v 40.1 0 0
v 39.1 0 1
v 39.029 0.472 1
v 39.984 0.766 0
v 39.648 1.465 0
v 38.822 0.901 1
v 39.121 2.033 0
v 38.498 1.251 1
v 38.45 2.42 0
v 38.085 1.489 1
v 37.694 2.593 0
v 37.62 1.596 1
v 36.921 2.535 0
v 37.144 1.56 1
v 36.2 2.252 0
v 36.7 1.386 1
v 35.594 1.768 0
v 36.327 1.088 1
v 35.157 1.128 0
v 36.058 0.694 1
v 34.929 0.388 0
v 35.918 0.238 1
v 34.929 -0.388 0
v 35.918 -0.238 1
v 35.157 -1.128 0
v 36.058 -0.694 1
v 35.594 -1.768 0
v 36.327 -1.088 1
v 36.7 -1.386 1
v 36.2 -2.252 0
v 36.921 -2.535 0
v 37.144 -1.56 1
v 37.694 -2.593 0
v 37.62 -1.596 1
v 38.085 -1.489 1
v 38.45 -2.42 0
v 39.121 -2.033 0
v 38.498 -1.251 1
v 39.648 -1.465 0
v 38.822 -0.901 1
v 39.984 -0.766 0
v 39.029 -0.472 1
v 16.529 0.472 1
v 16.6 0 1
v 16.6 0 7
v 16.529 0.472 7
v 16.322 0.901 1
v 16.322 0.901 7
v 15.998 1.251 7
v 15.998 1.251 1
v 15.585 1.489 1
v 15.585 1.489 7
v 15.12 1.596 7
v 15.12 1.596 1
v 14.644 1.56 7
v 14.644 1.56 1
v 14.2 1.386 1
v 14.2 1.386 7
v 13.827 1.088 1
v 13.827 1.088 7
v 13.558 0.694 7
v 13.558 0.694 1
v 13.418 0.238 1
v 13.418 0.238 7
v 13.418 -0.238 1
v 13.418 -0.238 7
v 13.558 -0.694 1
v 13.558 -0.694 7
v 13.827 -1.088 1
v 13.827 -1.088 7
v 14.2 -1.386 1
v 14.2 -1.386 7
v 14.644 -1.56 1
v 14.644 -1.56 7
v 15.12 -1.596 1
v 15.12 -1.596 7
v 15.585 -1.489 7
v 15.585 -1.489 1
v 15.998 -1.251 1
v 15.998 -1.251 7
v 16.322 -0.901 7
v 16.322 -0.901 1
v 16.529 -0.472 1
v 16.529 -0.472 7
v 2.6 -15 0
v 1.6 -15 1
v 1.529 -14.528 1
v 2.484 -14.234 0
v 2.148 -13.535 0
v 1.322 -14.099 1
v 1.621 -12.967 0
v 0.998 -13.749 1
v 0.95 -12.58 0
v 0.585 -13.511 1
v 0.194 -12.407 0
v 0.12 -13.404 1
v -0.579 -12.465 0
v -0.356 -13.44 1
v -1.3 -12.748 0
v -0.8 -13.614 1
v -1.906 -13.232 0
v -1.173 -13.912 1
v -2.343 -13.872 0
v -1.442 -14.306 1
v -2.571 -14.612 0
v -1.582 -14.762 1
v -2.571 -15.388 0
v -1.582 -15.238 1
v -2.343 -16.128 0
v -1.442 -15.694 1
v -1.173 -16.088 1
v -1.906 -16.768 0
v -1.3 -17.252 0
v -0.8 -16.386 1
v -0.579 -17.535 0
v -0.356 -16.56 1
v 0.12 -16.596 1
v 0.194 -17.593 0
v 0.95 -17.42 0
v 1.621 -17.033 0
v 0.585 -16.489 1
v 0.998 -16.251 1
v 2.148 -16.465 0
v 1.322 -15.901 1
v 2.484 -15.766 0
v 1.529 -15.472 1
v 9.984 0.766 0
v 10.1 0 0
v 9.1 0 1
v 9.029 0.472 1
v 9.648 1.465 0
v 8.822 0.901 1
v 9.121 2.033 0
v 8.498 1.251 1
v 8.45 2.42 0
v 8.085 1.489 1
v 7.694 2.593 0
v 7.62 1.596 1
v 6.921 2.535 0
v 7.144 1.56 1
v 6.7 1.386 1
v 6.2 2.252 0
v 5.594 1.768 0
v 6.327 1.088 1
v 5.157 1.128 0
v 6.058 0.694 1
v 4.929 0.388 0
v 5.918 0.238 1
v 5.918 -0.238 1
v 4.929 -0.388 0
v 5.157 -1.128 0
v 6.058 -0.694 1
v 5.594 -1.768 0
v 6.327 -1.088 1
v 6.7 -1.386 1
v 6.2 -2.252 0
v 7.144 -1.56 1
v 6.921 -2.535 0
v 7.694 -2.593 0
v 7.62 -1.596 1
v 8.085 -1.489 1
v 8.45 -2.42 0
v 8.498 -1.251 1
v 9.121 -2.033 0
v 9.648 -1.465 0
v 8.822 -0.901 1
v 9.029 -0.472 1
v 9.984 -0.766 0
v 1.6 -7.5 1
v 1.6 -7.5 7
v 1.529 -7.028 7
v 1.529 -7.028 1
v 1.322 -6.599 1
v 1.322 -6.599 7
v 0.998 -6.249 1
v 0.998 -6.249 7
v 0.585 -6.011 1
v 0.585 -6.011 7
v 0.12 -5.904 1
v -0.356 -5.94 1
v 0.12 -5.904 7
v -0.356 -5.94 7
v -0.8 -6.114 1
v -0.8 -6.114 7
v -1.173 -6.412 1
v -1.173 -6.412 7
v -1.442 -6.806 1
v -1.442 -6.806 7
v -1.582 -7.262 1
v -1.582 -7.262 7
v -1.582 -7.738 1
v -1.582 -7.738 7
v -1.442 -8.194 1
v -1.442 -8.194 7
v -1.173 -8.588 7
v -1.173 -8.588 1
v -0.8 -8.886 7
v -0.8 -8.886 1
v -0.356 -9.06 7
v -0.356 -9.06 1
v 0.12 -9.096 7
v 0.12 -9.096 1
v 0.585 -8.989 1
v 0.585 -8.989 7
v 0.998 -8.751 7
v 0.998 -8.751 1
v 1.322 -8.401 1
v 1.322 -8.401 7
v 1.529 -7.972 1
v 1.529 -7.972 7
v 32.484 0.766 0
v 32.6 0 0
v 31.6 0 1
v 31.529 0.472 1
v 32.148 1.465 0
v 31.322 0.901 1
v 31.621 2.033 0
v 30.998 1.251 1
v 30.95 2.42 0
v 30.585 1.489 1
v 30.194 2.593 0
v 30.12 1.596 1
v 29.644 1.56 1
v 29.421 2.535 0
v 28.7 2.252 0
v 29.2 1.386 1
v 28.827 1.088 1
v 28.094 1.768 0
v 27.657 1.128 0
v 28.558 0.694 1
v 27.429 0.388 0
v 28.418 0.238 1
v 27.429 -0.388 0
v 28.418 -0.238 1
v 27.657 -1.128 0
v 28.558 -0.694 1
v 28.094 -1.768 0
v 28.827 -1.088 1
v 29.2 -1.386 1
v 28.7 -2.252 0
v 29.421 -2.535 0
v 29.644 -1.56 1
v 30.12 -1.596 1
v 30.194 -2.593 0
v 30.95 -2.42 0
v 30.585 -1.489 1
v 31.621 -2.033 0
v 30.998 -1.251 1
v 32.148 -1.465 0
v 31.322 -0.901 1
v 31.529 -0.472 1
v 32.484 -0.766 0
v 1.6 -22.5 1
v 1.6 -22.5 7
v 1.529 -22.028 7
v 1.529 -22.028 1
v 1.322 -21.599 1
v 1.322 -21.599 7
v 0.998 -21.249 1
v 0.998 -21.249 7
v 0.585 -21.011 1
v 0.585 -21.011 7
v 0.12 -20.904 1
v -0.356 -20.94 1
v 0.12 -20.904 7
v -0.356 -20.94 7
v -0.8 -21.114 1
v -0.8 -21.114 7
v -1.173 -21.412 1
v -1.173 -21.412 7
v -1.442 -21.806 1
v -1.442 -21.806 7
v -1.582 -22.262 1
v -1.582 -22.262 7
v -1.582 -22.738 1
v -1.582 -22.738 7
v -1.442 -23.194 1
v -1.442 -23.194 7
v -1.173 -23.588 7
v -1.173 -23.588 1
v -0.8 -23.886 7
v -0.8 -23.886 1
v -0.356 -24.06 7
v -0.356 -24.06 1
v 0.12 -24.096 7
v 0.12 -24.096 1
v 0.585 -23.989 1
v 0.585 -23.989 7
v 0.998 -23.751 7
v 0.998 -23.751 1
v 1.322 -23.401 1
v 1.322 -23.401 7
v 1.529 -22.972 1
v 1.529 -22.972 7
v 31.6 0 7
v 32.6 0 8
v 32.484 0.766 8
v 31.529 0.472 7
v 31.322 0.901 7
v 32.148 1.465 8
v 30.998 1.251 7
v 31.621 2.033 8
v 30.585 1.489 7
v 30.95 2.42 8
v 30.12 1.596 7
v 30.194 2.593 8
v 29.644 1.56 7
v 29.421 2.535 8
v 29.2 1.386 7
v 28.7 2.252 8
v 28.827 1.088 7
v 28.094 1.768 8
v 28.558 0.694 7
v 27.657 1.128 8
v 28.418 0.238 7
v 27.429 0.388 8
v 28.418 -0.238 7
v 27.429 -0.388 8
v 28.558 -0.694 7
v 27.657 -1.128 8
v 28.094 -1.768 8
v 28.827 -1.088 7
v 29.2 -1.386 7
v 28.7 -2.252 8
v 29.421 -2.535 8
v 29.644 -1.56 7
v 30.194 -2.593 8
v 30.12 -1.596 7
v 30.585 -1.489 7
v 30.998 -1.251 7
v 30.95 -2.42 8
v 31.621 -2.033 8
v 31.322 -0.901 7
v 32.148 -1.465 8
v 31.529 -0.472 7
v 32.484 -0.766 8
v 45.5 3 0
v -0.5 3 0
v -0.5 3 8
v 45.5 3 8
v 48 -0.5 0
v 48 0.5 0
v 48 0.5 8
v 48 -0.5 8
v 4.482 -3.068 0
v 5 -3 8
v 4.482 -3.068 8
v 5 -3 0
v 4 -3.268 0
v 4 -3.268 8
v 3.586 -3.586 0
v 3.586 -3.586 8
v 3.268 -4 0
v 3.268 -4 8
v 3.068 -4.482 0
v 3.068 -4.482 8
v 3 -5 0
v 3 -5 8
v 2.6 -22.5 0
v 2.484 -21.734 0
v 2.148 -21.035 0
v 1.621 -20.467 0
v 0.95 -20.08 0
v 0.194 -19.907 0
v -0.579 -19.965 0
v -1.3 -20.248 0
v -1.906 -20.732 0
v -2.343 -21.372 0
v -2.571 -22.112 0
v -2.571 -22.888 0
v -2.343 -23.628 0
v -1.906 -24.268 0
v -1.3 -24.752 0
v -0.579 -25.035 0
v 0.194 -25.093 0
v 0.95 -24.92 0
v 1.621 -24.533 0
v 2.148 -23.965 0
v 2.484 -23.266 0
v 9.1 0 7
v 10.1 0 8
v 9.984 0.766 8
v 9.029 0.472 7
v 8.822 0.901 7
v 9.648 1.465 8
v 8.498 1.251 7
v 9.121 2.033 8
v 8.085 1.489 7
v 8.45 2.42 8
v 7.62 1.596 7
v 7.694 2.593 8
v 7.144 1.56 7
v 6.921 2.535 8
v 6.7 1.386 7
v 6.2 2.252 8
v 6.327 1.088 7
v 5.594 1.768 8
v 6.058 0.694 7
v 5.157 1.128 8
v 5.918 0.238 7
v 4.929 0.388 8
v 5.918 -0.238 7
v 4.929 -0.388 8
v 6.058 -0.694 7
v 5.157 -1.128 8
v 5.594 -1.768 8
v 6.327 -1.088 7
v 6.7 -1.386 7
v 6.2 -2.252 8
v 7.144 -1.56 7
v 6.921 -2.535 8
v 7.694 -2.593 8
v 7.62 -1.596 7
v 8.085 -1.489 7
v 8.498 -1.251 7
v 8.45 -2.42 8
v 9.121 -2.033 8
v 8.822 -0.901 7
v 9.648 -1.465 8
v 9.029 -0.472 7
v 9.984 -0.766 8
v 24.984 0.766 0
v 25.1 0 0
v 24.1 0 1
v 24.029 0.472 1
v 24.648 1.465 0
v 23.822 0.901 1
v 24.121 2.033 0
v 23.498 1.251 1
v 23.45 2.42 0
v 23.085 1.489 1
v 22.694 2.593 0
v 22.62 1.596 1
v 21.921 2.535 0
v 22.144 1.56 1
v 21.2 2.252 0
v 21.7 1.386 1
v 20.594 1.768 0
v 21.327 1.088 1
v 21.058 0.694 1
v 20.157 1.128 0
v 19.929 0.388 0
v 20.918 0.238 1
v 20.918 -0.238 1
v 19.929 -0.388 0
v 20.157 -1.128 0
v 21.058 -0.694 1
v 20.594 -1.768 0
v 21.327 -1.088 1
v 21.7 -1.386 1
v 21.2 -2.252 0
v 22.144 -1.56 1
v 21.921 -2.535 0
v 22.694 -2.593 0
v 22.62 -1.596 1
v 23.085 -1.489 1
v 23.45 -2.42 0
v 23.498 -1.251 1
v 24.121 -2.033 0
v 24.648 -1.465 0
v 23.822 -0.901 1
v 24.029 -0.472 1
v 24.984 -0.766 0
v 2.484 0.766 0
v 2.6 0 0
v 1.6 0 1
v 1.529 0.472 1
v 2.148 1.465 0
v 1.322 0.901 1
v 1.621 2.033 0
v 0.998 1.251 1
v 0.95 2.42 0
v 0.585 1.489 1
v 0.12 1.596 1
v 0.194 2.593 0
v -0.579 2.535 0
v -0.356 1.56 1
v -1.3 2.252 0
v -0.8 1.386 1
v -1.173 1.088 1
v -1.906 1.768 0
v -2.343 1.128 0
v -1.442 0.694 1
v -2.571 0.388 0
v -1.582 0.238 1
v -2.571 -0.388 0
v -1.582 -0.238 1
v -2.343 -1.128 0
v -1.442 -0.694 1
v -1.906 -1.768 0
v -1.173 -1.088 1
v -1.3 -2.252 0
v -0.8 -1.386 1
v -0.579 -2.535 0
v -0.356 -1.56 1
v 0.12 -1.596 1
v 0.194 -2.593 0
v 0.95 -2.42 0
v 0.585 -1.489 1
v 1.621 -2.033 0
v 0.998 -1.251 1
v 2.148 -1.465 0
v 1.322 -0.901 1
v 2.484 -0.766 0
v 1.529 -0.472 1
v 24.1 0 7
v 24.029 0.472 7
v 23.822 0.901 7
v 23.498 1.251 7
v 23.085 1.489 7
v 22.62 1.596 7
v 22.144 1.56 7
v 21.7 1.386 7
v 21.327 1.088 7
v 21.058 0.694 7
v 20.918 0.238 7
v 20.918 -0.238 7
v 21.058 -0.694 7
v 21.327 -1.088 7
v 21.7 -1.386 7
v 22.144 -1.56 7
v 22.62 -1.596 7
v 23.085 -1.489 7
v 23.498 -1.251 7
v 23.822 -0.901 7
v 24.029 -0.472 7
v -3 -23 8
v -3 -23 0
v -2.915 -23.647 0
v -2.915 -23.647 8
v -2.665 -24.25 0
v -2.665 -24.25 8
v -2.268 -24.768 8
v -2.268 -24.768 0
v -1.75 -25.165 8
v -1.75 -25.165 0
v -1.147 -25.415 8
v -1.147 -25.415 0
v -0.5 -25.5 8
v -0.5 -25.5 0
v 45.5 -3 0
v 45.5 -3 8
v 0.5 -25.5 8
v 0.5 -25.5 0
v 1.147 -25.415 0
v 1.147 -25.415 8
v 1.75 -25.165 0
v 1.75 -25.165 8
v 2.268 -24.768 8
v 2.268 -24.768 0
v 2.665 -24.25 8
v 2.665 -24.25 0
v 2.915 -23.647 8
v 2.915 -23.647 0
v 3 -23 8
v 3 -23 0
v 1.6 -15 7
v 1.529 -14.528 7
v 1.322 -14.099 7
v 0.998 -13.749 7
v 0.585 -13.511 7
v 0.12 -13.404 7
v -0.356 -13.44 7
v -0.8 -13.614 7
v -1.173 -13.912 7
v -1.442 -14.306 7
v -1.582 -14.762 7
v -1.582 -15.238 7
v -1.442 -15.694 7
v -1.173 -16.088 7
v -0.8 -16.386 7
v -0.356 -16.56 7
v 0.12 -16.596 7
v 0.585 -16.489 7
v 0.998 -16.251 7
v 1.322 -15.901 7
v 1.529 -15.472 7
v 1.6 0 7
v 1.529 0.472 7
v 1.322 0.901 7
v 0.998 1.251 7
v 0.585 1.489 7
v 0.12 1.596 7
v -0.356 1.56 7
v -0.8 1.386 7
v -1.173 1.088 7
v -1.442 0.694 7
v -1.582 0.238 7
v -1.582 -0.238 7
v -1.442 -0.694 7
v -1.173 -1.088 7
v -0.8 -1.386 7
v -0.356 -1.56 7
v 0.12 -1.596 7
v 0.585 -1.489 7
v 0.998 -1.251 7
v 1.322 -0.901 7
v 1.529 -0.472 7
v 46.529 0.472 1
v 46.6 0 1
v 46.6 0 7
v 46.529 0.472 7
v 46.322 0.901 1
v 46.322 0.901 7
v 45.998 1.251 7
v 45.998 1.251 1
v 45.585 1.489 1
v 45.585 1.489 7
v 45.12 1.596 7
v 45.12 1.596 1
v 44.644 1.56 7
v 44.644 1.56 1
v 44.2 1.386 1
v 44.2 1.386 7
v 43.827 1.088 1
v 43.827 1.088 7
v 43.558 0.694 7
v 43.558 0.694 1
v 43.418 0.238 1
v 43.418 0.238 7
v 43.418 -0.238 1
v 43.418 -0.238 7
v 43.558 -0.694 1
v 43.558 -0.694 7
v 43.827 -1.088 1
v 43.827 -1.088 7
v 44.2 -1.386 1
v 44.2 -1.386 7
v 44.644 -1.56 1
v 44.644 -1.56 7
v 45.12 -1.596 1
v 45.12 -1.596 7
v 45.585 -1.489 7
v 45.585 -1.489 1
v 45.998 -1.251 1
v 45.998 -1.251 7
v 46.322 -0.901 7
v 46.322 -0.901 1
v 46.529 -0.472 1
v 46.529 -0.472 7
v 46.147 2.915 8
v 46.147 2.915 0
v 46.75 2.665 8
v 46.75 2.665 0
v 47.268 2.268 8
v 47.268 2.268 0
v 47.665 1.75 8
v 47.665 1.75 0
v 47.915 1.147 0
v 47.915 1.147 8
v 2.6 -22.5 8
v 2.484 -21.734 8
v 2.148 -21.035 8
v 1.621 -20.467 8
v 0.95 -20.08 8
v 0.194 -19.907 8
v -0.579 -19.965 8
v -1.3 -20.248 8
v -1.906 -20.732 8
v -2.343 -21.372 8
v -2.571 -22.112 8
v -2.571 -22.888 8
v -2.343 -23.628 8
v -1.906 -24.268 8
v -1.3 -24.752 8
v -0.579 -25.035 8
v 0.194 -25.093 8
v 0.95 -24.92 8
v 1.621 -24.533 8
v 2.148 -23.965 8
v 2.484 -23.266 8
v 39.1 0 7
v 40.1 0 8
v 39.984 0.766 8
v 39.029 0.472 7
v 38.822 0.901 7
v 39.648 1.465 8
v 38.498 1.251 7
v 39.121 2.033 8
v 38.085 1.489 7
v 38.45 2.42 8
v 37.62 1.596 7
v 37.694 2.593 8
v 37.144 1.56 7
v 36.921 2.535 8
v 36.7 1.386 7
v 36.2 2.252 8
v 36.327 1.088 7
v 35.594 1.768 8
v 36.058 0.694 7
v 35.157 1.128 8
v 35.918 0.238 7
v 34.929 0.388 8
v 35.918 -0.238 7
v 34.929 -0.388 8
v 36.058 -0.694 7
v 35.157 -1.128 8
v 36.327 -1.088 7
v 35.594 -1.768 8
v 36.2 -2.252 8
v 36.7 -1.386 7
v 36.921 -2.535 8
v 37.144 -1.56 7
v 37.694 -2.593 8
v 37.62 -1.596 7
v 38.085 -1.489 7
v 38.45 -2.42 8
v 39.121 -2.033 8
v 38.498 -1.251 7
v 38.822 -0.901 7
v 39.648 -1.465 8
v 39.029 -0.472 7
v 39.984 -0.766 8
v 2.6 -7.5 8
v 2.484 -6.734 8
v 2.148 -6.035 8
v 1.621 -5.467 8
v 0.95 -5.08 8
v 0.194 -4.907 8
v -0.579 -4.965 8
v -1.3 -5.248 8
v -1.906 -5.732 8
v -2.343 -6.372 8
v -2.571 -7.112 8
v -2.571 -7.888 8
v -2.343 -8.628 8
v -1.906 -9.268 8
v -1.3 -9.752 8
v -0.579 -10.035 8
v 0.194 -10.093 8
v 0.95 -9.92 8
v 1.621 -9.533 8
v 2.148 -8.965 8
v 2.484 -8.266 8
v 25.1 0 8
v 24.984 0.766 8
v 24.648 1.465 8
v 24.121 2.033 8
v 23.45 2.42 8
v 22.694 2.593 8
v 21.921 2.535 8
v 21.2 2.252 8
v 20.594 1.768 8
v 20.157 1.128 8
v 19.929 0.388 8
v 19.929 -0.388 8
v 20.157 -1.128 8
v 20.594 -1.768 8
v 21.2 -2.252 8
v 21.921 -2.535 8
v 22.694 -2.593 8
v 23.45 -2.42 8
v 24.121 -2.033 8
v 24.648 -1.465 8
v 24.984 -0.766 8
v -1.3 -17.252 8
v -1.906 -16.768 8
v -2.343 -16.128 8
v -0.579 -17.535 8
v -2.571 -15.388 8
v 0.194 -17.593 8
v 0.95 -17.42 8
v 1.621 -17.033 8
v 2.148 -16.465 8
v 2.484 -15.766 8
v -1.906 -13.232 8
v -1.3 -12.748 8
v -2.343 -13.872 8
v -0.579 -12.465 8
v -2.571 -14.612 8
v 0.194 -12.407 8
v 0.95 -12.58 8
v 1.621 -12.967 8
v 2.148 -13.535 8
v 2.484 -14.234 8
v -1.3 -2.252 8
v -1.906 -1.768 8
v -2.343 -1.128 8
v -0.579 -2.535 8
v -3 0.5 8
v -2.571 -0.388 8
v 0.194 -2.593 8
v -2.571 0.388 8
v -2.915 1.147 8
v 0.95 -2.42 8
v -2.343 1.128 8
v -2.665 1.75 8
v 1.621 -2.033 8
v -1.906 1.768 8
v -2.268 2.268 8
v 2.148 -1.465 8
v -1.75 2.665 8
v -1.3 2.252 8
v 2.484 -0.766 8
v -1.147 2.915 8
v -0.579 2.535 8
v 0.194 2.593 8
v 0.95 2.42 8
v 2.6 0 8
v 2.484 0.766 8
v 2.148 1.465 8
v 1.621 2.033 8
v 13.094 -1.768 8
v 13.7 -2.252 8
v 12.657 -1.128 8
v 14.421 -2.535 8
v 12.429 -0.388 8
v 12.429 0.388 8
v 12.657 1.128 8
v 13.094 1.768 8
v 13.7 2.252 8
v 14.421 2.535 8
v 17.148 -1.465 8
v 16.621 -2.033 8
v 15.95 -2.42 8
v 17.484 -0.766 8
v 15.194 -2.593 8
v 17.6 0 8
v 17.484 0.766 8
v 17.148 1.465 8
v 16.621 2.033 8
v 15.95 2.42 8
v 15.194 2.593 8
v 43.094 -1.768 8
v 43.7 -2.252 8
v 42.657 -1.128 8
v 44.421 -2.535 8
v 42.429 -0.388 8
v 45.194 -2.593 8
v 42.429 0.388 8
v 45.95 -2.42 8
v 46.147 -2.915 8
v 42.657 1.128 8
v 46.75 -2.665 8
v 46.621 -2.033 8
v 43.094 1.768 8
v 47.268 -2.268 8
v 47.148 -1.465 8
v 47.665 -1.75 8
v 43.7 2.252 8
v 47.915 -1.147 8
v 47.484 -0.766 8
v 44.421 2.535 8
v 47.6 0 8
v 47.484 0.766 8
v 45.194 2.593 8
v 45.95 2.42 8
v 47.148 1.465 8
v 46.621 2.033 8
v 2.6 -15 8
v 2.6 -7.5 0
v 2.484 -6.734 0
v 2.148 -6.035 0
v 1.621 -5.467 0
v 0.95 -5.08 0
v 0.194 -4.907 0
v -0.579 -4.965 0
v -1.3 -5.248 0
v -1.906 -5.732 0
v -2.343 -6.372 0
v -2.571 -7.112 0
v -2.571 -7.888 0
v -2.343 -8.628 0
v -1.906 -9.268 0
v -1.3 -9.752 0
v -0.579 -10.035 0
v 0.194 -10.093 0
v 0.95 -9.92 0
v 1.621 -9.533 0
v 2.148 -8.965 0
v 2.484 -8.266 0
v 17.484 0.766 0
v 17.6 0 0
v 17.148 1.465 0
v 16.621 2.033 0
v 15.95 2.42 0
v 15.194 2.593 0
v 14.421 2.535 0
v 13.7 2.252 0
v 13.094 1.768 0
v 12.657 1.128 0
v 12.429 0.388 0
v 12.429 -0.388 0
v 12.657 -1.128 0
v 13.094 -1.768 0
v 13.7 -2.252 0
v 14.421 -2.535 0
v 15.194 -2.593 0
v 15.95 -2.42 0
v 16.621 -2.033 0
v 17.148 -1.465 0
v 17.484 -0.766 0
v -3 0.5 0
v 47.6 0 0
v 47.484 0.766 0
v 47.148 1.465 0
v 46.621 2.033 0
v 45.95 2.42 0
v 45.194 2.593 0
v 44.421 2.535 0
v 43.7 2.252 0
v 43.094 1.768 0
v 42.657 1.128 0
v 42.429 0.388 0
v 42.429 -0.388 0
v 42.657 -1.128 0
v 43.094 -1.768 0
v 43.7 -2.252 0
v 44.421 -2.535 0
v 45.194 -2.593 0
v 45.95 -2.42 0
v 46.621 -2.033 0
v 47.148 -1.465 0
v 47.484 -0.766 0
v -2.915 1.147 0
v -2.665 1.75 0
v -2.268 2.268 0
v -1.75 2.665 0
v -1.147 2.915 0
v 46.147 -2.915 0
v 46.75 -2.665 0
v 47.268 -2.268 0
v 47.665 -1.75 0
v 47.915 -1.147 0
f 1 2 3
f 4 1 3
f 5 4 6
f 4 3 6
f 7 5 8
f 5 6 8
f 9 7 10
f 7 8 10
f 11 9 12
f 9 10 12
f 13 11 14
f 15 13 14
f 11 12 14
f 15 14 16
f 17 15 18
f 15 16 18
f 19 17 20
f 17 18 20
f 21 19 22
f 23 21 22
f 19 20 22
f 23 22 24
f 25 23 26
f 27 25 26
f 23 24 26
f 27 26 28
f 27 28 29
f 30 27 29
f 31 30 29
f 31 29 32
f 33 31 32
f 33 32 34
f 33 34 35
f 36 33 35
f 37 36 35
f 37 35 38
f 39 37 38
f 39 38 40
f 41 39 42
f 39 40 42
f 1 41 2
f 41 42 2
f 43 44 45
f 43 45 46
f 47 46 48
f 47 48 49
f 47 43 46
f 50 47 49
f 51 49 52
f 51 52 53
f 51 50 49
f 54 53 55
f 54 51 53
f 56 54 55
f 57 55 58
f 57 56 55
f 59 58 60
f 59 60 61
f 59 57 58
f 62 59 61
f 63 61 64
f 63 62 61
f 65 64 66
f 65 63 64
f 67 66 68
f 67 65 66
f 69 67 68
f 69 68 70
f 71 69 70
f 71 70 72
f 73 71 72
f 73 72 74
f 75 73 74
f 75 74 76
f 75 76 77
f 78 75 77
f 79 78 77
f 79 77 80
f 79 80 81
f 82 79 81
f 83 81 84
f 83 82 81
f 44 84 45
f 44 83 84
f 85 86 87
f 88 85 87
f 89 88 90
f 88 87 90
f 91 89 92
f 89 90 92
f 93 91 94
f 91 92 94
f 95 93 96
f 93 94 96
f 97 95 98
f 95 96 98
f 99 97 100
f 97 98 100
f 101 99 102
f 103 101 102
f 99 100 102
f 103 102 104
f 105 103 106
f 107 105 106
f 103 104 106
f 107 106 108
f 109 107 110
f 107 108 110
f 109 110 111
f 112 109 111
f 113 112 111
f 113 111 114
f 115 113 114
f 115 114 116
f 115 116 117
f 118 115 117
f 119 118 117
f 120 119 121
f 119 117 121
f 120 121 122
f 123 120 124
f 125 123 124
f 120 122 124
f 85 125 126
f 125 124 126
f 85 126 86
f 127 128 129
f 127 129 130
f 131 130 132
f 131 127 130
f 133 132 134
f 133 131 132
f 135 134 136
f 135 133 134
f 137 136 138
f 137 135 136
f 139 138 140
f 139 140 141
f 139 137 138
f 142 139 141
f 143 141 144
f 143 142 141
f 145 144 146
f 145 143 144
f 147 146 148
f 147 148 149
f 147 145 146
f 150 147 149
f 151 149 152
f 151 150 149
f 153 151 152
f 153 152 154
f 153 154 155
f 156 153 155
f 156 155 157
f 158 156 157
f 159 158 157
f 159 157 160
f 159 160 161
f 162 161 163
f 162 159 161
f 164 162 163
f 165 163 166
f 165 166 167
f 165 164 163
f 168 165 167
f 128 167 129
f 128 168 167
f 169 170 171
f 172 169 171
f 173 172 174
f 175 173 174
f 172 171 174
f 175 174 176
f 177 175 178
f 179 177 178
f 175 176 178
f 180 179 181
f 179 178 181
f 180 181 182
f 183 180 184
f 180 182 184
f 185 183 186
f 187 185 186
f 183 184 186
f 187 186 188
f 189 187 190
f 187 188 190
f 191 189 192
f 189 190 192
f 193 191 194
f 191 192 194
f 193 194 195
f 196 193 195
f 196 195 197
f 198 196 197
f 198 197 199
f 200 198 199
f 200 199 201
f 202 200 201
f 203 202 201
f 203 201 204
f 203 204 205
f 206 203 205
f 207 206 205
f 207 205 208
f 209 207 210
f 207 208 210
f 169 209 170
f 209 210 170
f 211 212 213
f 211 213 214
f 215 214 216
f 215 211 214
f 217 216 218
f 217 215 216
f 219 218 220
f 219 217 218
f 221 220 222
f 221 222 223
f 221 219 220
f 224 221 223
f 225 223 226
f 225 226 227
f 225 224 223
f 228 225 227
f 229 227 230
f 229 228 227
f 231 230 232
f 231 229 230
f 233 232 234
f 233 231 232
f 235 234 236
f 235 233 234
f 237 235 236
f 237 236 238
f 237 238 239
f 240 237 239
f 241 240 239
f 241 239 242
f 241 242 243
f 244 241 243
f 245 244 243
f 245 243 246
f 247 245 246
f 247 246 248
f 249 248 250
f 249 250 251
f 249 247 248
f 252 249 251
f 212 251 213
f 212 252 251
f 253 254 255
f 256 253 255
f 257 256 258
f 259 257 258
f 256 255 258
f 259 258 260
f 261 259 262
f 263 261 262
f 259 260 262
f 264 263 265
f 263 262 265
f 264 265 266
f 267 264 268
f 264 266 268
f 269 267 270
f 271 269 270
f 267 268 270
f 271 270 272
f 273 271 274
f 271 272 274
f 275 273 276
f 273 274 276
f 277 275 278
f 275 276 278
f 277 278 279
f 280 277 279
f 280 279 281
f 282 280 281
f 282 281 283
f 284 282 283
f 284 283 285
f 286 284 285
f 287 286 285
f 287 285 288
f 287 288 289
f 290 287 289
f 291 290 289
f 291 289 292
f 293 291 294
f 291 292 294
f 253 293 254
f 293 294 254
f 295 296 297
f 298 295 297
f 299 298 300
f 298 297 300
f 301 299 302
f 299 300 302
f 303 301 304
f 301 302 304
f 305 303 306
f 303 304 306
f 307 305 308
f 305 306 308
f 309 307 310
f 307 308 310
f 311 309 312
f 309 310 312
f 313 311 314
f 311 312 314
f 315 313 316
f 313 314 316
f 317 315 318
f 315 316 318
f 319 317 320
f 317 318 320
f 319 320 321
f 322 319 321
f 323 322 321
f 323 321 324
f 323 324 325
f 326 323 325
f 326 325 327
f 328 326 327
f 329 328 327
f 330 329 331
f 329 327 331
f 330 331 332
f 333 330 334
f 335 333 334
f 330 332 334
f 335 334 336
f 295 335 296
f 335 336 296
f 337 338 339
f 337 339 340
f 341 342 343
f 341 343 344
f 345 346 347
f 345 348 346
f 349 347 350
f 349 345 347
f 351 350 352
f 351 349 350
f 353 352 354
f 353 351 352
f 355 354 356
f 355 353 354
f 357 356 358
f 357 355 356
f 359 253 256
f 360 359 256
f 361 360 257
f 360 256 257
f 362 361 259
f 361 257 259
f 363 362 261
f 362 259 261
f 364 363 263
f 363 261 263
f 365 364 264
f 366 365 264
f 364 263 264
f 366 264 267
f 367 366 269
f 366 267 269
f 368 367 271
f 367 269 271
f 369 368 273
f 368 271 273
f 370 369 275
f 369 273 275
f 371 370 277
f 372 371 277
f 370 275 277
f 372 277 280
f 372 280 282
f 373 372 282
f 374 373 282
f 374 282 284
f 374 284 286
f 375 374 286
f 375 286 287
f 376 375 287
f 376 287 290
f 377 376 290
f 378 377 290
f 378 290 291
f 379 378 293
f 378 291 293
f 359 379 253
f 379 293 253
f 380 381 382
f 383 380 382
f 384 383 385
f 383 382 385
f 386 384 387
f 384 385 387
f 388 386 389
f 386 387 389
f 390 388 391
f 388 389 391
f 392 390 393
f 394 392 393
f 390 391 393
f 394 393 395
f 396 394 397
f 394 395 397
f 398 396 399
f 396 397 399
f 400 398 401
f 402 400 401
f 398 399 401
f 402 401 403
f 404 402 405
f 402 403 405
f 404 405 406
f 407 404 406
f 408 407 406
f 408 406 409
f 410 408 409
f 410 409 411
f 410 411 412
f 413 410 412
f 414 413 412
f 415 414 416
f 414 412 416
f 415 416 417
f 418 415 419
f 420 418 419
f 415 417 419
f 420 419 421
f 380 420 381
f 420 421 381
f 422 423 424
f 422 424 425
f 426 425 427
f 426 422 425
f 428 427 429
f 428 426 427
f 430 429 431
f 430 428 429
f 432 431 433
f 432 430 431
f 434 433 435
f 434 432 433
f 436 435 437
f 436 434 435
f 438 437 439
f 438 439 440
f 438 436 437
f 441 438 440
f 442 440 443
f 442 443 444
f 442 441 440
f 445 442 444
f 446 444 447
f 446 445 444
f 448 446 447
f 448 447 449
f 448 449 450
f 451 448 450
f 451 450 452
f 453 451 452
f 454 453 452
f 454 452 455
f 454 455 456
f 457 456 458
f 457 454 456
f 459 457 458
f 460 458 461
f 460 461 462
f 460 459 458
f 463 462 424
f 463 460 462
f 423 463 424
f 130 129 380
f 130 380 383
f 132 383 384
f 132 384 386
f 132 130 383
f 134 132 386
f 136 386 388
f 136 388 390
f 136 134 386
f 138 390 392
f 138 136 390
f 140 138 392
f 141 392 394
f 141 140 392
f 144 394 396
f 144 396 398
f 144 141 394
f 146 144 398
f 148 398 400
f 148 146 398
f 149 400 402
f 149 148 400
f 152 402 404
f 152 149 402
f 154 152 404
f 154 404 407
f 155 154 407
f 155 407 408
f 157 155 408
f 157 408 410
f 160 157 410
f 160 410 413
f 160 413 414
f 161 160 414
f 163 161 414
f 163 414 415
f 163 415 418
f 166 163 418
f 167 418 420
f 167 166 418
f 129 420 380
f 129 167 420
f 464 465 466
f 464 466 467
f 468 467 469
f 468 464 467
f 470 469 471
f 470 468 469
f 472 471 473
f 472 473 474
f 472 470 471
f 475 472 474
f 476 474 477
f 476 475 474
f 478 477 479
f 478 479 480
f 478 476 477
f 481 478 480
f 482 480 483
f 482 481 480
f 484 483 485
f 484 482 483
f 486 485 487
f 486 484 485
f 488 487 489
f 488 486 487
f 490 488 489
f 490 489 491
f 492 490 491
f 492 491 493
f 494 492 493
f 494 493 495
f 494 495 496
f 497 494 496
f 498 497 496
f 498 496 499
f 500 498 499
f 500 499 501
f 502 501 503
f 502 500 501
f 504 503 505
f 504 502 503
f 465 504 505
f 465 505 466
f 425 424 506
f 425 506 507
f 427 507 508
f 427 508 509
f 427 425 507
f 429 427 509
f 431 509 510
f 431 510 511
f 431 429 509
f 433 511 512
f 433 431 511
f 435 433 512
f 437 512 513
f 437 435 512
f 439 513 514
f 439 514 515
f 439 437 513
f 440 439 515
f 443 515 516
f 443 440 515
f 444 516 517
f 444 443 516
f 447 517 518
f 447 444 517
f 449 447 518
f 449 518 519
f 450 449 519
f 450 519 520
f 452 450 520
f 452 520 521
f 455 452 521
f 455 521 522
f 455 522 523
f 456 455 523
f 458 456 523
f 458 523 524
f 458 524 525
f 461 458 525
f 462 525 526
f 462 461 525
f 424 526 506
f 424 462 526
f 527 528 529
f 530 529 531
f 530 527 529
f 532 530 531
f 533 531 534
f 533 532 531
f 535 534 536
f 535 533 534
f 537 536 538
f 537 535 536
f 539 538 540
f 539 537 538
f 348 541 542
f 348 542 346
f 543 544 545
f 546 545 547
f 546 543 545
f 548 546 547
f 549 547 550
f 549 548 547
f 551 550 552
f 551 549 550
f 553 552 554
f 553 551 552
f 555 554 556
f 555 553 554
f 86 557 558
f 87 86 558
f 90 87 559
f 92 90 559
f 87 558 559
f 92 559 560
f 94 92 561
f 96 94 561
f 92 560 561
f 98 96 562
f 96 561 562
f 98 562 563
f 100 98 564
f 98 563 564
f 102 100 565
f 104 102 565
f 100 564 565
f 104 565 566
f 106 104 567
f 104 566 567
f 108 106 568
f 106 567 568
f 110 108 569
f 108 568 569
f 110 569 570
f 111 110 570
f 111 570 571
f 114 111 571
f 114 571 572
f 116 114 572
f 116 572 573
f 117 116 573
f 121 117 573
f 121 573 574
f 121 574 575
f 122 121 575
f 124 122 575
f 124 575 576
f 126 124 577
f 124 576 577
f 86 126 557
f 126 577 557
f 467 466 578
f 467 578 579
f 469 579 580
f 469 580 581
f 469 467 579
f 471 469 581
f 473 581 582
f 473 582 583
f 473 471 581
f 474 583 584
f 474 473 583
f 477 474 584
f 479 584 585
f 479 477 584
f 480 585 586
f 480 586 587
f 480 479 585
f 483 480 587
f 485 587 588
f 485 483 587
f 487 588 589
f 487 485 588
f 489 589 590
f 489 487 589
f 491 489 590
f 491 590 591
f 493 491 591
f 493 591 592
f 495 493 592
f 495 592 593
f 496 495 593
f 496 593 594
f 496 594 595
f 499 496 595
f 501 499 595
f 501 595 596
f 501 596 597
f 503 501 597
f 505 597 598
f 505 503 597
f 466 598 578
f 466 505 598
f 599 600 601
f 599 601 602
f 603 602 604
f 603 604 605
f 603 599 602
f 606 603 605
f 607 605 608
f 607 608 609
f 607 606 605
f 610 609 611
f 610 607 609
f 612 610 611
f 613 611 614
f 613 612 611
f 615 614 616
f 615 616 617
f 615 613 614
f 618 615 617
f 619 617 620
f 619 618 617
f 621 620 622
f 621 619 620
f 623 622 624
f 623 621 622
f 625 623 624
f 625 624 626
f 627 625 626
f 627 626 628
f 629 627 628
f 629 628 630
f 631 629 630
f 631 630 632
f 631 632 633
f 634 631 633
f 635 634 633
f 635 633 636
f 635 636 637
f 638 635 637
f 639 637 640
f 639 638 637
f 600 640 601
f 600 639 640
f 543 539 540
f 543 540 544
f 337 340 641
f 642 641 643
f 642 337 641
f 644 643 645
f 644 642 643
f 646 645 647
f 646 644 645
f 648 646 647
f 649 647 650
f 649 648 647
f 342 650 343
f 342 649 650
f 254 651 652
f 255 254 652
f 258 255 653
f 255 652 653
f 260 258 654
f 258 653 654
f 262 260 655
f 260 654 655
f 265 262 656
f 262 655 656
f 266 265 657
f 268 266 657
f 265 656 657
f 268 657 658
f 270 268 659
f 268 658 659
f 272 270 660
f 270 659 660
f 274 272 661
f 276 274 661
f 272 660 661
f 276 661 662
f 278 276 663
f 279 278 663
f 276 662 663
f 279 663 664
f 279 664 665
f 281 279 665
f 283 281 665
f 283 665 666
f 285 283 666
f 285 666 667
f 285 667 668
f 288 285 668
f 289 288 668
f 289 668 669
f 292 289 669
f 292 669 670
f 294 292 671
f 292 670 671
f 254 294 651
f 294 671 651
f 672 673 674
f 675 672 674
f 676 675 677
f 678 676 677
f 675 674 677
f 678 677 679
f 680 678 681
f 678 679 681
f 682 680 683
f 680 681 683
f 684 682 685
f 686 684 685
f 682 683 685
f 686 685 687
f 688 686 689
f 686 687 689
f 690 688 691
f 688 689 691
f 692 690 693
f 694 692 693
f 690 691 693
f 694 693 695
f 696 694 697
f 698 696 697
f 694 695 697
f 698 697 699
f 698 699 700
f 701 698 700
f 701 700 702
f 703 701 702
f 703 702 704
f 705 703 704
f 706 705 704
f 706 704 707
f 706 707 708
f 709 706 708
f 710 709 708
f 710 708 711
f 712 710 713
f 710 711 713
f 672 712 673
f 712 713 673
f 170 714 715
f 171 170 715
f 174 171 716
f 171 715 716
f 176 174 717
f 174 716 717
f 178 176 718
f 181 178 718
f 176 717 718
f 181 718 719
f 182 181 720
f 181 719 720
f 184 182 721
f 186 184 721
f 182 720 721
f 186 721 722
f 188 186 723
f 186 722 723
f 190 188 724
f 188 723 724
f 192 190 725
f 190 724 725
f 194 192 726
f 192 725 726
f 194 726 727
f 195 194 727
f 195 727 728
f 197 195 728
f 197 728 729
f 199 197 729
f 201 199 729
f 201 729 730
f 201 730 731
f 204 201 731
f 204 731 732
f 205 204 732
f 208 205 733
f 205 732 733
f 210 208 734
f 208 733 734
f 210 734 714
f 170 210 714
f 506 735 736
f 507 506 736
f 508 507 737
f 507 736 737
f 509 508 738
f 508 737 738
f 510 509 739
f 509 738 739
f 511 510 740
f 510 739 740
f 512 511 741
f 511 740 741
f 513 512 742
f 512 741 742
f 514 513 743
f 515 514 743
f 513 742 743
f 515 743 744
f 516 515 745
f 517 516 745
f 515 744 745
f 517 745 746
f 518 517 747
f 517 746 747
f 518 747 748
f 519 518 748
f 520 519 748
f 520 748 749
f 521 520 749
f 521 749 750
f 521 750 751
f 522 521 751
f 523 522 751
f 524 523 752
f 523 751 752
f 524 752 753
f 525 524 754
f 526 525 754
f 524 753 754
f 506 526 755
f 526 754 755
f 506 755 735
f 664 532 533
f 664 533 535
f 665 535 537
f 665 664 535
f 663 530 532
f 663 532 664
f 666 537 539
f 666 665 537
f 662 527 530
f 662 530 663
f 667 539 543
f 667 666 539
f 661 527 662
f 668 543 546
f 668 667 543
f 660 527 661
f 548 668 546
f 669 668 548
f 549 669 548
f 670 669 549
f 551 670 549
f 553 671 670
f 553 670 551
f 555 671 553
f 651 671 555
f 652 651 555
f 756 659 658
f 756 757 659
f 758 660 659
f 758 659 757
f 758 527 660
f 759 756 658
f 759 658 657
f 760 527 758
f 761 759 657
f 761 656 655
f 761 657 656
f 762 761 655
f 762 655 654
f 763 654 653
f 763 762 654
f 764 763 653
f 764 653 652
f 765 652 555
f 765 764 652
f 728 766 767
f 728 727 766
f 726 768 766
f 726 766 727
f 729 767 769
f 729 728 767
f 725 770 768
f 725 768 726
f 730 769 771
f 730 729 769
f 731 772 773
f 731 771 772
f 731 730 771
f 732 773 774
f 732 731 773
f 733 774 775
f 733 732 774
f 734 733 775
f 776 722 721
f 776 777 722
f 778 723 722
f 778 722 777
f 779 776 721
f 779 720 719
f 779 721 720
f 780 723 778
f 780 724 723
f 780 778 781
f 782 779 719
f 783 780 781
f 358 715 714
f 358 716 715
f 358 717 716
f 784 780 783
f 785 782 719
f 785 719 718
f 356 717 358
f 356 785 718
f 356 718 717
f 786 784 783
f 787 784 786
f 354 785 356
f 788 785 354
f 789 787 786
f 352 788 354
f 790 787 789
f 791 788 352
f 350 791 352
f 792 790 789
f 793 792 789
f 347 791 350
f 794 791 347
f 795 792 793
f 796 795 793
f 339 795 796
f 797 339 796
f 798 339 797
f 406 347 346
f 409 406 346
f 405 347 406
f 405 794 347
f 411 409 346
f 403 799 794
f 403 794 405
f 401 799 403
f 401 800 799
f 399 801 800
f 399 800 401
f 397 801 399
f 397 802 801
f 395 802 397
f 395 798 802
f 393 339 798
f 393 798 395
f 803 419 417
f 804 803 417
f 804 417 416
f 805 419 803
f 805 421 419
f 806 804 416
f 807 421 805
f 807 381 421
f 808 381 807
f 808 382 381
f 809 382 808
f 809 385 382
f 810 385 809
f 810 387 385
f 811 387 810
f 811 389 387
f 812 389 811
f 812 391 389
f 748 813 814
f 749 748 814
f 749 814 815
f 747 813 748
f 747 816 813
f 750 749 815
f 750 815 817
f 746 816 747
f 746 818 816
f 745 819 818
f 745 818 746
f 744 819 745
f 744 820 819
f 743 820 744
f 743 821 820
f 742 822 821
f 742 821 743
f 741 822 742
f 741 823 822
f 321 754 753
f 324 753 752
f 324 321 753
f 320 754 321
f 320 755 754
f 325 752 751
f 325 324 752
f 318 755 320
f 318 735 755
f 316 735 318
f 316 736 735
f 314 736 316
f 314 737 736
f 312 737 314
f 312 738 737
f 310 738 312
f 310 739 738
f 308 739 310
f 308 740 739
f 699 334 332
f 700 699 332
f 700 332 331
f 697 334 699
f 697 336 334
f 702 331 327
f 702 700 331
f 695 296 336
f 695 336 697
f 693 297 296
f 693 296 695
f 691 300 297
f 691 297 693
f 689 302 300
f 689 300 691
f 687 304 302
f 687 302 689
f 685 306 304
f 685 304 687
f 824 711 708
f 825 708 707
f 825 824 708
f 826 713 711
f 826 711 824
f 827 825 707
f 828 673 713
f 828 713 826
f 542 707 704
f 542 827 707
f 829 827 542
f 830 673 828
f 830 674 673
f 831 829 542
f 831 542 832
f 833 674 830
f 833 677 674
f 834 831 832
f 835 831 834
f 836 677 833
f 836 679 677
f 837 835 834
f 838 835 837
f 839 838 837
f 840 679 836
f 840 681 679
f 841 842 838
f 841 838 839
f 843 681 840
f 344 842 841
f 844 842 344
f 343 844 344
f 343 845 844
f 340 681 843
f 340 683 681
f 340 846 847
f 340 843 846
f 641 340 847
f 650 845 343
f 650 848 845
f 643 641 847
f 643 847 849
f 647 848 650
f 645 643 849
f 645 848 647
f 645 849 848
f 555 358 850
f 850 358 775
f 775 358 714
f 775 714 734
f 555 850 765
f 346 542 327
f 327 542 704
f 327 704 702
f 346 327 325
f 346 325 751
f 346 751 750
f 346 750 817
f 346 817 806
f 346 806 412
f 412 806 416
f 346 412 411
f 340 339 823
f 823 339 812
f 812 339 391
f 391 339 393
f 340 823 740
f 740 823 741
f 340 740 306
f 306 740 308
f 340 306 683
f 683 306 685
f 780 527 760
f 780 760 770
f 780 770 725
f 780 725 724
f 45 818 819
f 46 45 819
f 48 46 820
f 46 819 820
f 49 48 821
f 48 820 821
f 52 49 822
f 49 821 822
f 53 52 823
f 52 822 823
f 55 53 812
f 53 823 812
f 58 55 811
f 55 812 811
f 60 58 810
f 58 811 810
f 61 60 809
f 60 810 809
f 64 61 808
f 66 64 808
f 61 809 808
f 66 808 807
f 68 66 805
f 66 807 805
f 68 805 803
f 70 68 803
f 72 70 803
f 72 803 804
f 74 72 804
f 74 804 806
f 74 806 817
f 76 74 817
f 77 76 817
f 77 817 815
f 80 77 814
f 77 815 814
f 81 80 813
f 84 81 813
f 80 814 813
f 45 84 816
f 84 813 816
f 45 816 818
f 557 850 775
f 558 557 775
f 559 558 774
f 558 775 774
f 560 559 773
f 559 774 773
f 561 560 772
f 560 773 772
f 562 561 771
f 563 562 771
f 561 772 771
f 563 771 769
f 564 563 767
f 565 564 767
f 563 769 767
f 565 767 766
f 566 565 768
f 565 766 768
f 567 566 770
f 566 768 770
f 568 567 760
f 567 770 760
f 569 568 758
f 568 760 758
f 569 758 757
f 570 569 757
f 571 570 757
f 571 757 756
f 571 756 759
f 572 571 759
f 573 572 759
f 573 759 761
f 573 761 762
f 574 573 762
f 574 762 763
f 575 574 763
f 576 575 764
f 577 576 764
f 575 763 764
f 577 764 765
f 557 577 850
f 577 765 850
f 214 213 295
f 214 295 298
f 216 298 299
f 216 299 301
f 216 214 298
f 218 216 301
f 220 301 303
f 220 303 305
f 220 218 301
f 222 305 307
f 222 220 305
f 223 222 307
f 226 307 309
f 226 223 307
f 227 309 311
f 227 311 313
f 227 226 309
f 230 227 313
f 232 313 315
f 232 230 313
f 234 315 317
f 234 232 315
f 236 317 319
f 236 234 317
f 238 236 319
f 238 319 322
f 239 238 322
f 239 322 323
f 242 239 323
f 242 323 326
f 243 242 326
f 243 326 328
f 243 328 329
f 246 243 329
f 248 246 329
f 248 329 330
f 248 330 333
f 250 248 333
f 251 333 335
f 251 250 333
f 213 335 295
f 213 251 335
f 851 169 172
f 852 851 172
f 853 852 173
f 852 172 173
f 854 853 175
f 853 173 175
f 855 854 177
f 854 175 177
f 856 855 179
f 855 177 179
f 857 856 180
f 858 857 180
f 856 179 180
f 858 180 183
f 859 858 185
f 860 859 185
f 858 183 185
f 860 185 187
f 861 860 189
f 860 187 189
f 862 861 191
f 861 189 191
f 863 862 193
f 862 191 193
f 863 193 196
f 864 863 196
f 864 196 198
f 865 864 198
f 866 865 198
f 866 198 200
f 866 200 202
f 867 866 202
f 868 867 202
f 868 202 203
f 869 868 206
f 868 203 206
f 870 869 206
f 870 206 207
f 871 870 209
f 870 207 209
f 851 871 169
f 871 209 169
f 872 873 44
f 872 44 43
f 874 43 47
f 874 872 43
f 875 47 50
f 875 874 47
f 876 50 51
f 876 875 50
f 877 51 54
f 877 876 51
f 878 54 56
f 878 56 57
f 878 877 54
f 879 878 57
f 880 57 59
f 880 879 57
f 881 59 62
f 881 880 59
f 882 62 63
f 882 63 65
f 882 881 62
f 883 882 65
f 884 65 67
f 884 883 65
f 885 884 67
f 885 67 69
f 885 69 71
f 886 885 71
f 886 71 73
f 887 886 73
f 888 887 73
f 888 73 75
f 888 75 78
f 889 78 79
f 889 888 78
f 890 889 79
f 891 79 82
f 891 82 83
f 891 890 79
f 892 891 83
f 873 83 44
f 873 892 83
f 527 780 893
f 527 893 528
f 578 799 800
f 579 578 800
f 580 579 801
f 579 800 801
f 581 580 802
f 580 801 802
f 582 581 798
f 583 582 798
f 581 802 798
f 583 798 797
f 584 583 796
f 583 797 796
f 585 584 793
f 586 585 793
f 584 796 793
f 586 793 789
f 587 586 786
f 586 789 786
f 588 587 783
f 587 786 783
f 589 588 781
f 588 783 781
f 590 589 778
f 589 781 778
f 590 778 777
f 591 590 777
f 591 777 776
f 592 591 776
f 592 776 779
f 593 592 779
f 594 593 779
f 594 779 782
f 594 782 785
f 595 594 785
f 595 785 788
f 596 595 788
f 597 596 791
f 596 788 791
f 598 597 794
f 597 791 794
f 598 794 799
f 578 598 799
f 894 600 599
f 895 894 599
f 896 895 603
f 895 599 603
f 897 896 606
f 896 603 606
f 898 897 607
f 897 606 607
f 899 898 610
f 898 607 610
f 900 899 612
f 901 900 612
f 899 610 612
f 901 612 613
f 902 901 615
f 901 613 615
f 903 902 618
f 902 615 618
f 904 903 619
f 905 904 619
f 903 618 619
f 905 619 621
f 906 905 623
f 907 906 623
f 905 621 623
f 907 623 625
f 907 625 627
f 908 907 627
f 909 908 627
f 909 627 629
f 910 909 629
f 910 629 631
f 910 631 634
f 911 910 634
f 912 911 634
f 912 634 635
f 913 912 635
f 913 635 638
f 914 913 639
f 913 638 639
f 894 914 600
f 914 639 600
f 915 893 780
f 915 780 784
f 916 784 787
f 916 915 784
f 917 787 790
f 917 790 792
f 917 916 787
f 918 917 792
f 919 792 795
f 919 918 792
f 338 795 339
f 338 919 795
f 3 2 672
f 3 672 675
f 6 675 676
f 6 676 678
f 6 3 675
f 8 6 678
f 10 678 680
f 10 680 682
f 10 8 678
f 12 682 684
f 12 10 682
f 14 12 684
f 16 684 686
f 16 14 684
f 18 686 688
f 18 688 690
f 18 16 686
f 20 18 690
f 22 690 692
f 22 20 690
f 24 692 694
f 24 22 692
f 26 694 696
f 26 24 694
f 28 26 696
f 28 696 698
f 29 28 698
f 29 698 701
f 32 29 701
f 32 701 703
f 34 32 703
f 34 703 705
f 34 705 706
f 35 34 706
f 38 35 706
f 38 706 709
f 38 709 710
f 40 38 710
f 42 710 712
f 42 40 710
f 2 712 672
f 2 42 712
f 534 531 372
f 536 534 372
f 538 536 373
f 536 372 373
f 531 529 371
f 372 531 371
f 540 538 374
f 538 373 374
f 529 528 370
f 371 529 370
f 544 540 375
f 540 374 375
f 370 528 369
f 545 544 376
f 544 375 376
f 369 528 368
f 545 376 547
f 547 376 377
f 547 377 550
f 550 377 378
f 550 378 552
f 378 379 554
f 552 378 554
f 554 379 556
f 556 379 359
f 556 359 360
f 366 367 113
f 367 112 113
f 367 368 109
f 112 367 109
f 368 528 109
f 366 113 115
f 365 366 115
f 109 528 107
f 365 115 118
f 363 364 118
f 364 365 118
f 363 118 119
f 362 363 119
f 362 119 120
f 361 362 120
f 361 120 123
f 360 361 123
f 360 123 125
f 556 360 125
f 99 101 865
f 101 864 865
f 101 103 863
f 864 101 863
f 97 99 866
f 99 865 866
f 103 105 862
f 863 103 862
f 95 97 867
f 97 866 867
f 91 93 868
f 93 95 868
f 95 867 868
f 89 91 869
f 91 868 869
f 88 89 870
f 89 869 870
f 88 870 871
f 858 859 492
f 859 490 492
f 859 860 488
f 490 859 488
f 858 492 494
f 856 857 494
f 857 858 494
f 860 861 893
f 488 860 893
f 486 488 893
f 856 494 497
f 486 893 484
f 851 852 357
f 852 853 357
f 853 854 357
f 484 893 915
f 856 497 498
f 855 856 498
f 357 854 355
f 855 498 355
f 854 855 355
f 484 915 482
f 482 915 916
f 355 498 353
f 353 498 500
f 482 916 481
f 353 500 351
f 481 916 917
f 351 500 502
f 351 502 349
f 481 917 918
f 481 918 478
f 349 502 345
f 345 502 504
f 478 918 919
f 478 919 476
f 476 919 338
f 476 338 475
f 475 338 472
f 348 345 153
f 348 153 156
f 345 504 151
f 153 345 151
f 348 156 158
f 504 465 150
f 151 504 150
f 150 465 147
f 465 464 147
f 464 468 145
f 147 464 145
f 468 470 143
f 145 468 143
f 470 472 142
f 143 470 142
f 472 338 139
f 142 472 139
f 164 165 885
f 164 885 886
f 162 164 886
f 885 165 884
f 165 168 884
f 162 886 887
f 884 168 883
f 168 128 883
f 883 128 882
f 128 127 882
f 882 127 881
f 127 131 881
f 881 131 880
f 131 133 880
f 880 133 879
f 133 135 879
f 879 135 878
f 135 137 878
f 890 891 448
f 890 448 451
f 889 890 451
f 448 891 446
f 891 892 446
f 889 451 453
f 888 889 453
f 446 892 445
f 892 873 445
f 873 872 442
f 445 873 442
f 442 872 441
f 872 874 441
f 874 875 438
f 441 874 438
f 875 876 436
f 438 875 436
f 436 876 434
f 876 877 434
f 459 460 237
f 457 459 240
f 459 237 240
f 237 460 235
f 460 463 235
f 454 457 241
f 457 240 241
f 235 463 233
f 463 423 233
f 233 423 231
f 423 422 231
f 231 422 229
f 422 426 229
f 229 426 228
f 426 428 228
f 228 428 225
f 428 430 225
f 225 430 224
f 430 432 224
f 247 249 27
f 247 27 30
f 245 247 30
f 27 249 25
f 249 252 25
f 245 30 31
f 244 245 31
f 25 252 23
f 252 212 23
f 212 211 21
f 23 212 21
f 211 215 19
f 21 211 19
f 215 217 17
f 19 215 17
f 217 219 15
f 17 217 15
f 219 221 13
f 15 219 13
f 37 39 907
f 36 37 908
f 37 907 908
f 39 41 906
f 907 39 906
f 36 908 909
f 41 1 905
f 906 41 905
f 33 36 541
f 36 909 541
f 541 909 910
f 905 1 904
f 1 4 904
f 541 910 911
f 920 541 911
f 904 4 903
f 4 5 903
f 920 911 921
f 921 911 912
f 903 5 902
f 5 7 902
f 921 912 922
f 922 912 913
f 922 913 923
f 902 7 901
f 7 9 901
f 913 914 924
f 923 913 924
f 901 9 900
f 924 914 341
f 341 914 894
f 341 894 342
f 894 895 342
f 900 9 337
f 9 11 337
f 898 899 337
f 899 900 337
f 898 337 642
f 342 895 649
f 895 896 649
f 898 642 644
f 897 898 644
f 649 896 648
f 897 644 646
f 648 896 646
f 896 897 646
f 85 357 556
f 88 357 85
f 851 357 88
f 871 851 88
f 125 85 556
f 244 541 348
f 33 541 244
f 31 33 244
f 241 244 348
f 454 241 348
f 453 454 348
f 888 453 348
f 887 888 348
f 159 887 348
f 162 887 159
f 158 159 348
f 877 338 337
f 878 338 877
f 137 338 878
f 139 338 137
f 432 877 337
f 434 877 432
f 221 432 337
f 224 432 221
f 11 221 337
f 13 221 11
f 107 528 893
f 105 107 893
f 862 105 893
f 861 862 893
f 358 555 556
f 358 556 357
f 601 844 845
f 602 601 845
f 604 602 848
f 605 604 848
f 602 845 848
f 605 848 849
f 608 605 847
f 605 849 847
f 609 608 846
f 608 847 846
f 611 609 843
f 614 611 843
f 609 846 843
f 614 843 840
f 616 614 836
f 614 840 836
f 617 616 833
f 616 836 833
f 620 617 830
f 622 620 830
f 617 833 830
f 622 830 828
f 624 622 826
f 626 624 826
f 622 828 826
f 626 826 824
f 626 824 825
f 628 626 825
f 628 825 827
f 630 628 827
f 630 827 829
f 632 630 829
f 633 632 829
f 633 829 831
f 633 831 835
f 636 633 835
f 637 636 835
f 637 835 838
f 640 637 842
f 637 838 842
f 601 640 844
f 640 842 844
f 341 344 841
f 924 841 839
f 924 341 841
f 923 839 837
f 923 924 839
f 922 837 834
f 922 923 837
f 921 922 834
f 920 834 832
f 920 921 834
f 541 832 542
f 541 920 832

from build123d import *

# Parameters (mm, degrees)
SKETCH1_R           = 1.6
BOSS_EXTRUDE1_DEPTH = 8
CHAMFER1_SIZE       = 1
SKETCH2_R           = 1.6
BOSS_EXTRUDE3_DEPTH = 8
FILLET1_R           = 2
CHAMFER3_SIZE       = 1
CHAMFER5_SIZE       = 1


with BuildPart() as part:
    # Sketch1 → Boss-Extrude1 (new body)
    with BuildSketch(Plane.XY):
        with BuildLine():
            Line((-0.5, 3), (45.5, 3))
            ThreePointArc((45.5, 3), (47.267766953, 2.267766953), (48, 0.5))
            Line((48, 0.5), (48, -0.5))
            ThreePointArc((48, -0.5), (47.267766953, -2.267766953), (45.5, -3))
            Line((45.5, -3), (-0.5, -3))
            ThreePointArc((-0.5, -3), (-2.267766953, -2.267766953), (-3, -0.5))
            Line((-3, -0.5), (-3, 0.5))
            ThreePointArc((-3, 0.5), (-2.267766953, 2.267766953), (-0.5, 3))
        make_face()
        Circle(SKETCH1_R, mode=Mode.SUBTRACT)
        with Locations((7.5, 0)):
            Circle(SKETCH1_R, mode=Mode.SUBTRACT)
        with Locations((15, 0)):
            Circle(SKETCH1_R, mode=Mode.SUBTRACT)
        with Locations((22.5, 0)):
            Circle(SKETCH1_R, mode=Mode.SUBTRACT)
        with Locations((30, 0)):
            Circle(SKETCH1_R, mode=Mode.SUBTRACT)
        with Locations((37.5, 0)):
            Circle(SKETCH1_R, mode=Mode.SUBTRACT)
        with Locations((45, 0)):
            Circle(SKETCH1_R, mode=Mode.SUBTRACT)
    extrude(amount=BOSS_EXTRUDE1_DEPTH)

    # Chamfer1
    chamfer1_edges = [part.edges().sort_by_distance(p)[0] for p in [
        (-1.6, 0, 0),
        (-1.6, 0, 8),
        (5.9, 0, 0),
        (5.9, 0, 8),
        (13.4, 0, 0),
        (13.4, 0, 8),
        (20.9, 0, 0),
        (20.9, 0, 8),
        (28.4, 0, 0),
        (28.4, 0, 8),
    ]]
    chamfer(chamfer1_edges, length=CHAMFER1_SIZE)

    # Sketch2 → Boss-Extrude3 (add)
    with BuildSketch(Plane.XY.offset(8)):
        with BuildLine():
            ThreePointArc((-0.5, -3), (-2.267766953, -2.267766953), (-3, -0.5))
            Line((-3, -0.5), (-3, -23))
            ThreePointArc((-3, -23), (-2.267766953, -24.767766953), (-0.5, -25.5))
            Line((-0.5, -25.5), (0.5, -25.5))
            ThreePointArc((0.5, -25.5), (2.267766953, -24.767766953), (3, -23))
            Line((3, -23), (3, -3))
            Line((3, -3), (-0.5, -3))
        make_face()
        with Locations((0, -22.5)):
            Circle(SKETCH2_R, mode=Mode.SUBTRACT)
        with Locations((0, -15)):
            Circle(SKETCH2_R, mode=Mode.SUBTRACT)
        with Locations((0, -7.5)):
            Circle(SKETCH2_R, mode=Mode.SUBTRACT)
    extrude(amount=-BOSS_EXTRUDE3_DEPTH)

    # Fillet1
    fillet1_edges = [part.edges().sort_by_distance(p)[0] for p in [
        (3, -3, 4),
    ]]
    fillet(fillet1_edges, radius=FILLET1_R)

    # Chamfer3
    chamfer3_edges = [part.edges().sort_by_distance(p)[0] for p in [
        (35.9, 0, 0),
        (35.9, 0, 8),
        (43.4, 0, 0),
        (43.4, 0, 8),
    ]]
    chamfer(chamfer3_edges, length=CHAMFER3_SIZE)

    # Chamfer5
    chamfer5_edges = [part.edges().sort_by_distance(p)[0] for p in [
        (-1.6, -7.5, 8),
        (-1.6, -15, 8),
        (-1.6, -22.5, 8),
        (-1.6, -22.5, 0),
        (-1.6, -15, 0),
        (-1.6, -7.5, 0),
    ]]
    chamfer(chamfer5_edges, length=CHAMFER5_SIZE)


solid = part.part
